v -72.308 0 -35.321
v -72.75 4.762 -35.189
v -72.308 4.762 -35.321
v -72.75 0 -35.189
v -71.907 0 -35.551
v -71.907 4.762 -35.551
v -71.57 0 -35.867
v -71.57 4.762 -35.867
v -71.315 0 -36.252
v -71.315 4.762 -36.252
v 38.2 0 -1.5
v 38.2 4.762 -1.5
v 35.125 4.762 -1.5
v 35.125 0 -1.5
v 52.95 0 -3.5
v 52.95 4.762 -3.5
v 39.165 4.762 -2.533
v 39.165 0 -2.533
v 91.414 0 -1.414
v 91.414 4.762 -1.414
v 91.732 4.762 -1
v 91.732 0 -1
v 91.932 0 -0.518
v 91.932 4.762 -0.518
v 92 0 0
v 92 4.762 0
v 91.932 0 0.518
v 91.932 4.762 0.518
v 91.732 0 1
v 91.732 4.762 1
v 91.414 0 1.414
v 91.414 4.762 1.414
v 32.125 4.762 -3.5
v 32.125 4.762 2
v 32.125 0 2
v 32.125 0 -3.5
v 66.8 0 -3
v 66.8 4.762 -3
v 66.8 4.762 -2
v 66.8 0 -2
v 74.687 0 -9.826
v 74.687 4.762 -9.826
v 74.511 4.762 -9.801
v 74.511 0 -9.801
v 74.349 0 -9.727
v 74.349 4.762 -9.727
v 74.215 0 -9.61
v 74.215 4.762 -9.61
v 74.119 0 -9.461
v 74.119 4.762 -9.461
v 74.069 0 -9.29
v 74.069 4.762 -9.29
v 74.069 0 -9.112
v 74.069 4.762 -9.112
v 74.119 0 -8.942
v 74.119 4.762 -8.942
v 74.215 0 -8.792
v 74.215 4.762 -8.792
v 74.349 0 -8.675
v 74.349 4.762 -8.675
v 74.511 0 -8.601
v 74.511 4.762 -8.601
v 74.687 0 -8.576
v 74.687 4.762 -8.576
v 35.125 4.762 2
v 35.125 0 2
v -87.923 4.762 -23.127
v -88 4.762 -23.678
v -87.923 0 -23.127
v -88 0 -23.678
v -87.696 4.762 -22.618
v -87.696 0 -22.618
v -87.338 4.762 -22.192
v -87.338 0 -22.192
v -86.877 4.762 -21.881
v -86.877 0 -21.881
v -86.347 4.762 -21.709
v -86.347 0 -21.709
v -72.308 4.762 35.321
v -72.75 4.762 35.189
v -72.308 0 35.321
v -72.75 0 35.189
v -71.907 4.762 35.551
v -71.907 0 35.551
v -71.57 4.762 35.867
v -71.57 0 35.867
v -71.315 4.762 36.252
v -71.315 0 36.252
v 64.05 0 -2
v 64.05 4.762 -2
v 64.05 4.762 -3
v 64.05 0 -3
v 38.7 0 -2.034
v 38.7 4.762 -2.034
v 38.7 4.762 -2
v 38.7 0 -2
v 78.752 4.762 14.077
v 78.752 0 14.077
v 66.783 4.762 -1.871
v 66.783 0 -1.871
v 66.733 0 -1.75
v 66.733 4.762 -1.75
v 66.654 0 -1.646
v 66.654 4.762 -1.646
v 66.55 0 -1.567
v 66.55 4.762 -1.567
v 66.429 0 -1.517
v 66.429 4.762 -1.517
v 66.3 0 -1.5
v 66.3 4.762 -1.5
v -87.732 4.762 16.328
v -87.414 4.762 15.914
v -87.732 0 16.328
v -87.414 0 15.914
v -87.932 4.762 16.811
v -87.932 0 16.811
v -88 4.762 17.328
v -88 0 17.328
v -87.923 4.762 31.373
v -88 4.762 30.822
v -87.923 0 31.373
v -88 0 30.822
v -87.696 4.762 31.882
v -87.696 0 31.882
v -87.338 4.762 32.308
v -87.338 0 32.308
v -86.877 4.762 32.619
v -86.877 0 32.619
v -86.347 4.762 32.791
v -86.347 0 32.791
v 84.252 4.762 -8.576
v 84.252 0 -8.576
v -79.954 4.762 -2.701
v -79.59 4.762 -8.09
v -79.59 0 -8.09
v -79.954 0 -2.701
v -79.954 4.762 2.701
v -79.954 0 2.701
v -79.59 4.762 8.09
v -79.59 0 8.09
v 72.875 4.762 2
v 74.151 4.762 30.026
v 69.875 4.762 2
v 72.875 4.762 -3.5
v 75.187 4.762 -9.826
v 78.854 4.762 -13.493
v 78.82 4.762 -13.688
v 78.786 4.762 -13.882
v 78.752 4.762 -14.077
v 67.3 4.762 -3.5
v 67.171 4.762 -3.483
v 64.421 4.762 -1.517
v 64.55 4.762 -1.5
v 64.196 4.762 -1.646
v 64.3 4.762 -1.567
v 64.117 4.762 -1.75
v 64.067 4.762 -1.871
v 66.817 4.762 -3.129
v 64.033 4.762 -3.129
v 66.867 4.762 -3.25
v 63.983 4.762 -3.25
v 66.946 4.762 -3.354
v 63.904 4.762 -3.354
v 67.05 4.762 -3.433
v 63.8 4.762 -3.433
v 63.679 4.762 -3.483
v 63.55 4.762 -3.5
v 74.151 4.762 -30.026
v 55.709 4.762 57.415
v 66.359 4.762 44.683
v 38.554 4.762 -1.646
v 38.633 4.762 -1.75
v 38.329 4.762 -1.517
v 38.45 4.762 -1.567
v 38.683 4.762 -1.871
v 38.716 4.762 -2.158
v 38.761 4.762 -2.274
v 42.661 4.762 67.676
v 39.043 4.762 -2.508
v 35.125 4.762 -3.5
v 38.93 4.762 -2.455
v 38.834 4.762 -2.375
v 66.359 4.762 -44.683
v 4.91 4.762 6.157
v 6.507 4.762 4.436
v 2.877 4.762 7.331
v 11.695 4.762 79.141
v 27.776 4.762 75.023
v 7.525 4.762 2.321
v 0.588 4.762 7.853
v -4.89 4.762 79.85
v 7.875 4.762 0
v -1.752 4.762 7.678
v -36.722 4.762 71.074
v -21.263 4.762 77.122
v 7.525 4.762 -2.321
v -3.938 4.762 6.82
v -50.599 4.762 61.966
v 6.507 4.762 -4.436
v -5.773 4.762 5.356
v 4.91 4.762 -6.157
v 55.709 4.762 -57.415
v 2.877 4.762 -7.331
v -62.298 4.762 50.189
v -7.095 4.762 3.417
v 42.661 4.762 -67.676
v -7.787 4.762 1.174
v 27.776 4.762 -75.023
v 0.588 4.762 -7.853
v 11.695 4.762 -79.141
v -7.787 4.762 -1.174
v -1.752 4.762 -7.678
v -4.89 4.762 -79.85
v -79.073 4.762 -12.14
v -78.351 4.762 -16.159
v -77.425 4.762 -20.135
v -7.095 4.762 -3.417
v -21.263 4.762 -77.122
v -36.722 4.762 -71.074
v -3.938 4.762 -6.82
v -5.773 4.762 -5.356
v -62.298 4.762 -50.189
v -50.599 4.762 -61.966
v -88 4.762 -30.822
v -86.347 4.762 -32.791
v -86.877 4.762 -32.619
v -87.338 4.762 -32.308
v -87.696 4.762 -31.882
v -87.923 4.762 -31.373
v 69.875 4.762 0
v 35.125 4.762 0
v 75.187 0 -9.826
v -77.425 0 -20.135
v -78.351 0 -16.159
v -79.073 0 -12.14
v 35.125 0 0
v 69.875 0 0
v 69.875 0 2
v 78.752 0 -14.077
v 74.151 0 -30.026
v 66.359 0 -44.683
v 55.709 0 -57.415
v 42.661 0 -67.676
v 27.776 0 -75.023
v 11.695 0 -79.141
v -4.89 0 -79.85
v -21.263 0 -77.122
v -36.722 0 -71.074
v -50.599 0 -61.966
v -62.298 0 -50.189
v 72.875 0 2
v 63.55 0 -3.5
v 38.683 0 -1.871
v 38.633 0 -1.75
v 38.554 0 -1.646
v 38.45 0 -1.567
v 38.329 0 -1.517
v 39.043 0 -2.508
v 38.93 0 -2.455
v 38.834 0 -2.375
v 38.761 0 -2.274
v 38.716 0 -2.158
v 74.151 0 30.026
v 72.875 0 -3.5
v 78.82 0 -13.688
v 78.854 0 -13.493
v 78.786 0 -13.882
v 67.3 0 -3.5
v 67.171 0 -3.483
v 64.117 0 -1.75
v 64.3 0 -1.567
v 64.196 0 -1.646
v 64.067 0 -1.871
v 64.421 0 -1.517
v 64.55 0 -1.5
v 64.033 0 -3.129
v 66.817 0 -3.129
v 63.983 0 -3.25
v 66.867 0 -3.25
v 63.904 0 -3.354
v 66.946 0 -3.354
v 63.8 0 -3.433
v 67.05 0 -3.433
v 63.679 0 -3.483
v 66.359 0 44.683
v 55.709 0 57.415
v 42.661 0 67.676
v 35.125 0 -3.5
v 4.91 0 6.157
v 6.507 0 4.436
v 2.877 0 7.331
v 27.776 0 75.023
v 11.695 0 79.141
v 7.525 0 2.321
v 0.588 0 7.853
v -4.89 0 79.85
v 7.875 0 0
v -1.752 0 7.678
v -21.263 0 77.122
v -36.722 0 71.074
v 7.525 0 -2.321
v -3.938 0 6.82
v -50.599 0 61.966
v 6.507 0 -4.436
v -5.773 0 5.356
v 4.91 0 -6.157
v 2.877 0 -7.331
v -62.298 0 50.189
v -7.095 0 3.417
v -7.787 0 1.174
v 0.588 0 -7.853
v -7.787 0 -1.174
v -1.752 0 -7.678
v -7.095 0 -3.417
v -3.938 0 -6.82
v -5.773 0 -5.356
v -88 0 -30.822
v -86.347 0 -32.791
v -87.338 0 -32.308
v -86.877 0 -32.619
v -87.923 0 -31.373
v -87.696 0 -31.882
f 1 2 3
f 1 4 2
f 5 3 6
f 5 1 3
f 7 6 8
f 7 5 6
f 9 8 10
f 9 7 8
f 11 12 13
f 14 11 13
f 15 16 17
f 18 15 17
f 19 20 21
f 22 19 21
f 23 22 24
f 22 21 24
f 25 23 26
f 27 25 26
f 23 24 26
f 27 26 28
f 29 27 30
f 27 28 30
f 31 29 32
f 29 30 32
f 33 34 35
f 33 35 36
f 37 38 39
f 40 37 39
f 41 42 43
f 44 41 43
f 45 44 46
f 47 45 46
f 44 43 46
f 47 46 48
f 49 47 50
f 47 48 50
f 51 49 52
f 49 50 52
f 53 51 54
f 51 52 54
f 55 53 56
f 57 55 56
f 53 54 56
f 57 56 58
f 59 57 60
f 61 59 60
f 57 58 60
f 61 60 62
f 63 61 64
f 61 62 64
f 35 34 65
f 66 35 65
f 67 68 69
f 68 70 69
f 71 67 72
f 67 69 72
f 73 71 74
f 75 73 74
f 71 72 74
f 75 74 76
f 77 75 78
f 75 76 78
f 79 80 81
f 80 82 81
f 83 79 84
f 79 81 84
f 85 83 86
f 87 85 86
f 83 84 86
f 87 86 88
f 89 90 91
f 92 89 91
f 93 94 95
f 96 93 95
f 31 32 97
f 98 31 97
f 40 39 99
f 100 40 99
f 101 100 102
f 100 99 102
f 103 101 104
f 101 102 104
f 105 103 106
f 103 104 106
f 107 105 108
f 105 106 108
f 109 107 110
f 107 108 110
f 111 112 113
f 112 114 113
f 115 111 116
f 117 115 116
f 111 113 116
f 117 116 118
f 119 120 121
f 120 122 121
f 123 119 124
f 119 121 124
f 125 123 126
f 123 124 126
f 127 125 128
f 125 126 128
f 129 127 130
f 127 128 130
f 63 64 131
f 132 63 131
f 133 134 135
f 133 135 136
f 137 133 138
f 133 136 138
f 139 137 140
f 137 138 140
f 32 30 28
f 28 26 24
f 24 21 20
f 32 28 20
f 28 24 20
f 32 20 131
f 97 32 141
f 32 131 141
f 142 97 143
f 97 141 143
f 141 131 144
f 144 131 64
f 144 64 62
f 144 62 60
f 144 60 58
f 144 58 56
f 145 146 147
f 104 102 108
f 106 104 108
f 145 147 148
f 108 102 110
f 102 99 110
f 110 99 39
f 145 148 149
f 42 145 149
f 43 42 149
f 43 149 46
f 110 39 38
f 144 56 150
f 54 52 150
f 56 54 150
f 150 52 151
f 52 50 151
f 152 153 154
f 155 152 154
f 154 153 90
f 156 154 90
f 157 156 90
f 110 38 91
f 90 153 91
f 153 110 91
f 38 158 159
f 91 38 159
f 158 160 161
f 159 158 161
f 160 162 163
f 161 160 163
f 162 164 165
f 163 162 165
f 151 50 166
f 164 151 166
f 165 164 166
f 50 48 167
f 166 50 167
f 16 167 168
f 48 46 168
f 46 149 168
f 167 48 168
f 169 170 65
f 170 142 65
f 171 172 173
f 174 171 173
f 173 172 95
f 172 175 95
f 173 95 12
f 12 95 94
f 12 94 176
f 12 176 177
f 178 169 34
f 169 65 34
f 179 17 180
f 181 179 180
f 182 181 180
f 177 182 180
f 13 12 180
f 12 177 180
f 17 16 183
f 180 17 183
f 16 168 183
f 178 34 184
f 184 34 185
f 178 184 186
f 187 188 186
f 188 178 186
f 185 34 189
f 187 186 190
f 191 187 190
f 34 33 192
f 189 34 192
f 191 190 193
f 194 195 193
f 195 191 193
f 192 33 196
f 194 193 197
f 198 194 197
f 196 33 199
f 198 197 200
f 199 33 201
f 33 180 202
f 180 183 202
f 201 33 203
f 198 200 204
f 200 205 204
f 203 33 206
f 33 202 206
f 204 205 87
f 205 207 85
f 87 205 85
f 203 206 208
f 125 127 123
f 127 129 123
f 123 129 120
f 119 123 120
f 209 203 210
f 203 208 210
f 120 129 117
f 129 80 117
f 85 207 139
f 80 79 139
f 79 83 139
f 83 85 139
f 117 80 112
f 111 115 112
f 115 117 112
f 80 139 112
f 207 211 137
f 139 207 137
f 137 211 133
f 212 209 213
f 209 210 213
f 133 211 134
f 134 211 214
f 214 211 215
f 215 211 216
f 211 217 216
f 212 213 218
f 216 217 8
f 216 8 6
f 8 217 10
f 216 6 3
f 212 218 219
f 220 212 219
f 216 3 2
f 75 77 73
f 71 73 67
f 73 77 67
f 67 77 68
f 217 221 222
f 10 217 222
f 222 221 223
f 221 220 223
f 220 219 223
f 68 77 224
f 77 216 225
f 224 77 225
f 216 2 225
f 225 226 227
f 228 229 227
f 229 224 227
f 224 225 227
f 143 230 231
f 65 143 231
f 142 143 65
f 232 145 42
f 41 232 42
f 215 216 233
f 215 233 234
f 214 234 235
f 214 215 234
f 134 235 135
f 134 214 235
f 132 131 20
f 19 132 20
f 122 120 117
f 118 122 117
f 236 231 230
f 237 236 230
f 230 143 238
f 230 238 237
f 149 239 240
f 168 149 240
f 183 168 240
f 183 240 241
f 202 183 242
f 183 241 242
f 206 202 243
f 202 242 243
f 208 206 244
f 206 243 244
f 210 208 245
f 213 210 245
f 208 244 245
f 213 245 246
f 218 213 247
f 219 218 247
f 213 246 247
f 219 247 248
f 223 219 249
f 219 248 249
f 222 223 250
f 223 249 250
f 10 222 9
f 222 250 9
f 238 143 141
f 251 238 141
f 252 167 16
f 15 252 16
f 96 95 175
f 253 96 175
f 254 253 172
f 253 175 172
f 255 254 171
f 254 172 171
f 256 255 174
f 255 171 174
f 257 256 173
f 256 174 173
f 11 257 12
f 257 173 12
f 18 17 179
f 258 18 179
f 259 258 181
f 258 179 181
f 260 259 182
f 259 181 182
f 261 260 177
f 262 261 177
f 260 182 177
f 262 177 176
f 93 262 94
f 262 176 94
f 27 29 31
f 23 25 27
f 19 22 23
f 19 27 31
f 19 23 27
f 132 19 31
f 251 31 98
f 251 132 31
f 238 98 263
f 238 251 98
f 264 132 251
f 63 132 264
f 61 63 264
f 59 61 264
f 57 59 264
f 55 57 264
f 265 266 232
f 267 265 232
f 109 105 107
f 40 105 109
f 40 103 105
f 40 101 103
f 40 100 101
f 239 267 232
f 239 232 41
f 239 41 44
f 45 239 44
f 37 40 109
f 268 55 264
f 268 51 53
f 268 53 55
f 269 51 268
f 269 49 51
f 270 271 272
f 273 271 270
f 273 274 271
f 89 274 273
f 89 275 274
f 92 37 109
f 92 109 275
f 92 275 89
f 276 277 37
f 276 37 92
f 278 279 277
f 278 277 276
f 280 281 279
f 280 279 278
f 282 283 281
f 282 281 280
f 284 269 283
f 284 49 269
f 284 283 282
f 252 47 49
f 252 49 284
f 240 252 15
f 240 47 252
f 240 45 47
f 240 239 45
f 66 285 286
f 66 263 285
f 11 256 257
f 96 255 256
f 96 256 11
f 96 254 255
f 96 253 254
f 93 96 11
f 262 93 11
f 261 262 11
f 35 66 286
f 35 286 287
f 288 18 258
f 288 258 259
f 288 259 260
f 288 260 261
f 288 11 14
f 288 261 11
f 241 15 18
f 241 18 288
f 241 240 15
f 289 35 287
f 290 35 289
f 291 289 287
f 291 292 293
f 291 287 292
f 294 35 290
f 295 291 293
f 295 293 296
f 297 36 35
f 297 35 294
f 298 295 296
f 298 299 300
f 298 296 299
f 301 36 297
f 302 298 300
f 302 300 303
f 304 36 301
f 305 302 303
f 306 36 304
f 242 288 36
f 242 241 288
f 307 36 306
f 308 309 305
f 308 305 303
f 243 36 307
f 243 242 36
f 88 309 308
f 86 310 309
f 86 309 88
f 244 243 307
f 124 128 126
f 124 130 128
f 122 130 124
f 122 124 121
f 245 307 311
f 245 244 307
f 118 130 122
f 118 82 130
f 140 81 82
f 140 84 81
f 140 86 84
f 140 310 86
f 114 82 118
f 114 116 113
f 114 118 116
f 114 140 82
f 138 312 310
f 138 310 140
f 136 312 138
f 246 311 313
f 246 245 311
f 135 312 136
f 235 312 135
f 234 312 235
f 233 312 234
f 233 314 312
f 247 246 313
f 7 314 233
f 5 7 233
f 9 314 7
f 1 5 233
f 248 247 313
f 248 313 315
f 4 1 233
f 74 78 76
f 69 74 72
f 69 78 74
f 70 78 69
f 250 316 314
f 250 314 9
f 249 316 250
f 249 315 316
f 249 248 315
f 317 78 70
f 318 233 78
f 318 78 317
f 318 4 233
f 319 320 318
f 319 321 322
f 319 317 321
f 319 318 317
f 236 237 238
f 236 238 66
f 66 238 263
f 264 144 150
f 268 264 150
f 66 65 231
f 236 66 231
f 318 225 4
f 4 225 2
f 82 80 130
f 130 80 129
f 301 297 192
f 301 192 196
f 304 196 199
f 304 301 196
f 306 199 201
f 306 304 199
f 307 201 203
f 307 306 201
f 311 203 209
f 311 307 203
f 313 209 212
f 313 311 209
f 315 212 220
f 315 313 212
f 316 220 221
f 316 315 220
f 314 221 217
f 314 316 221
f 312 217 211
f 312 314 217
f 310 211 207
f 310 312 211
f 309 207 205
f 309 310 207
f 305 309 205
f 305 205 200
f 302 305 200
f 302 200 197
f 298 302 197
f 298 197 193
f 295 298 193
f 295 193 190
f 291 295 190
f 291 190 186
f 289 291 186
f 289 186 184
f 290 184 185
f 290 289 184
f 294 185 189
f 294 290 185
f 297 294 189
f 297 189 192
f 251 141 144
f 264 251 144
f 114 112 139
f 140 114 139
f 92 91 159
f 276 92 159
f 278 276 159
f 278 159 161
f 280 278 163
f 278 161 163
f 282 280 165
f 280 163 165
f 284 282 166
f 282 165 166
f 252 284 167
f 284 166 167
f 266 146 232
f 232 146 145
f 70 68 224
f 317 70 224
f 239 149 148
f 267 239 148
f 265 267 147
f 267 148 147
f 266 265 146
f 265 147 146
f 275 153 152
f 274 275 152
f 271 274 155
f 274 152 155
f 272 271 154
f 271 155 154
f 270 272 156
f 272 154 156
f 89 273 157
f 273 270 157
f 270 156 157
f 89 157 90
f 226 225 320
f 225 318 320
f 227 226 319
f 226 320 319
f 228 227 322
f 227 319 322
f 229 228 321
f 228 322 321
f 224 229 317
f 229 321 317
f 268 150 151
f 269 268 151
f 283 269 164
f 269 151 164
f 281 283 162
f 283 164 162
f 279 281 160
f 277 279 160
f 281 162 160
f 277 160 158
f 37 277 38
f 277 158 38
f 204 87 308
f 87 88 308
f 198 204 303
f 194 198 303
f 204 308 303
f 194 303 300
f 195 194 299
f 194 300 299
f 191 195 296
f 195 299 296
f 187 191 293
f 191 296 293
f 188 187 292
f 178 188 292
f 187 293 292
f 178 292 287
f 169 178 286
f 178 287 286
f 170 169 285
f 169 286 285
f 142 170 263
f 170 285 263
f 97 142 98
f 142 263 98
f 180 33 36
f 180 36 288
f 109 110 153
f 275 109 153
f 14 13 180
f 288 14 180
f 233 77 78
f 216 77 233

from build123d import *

# Parameters (mm, degrees)
SKETCH1_R           = 80
SKETCH1_R_2         = 7.875
BOSS_EXTRUDE1_DEPTH = 4.7625
CUT_EXTRUDE1_DEPTH  = 5.7625
BOSS_EXTRUDE2_DEPTH = 4.7625
CUT_EXTRUDE2_DEPTH  = 5.7625
CUT_EXTRUDE5_DEPTH  = 5.7625
FILLET1_R           = 2
SKETCH8_W           = 3
SKETCH8_H           = 5.5
CUT_EXTRUDE6_DEPTH  = 5.7625


with BuildPart() as part:
    # Sketch1 → Boss-Extrude1 (new body)
    with BuildSketch(Plane(origin=(0, 0, 0), x_dir=(1, 0, 0), z_dir=(0, 1, 0))):
        Circle(SKETCH1_R)
        Circle(SKETCH1_R_2, mode=Mode.SUBTRACT)
    extrude(amount=BOSS_EXTRUDE1_DEPTH)

    # Sketch2 → Cut-Extrude1 (cut, through all)
    with BuildSketch(Plane(origin=(0, 4.7625, 0), x_dir=(1, 0, 0), z_dir=(0, 1, 0))):
        with BuildLine():
            Line((34.2, 0), (70.8, 0))
            Line((70.8, 0), (70.8, 3))
            ThreePointArc((70.8, 3), (70.653553391, 3.353553391), (70.3, 3.5))
            Line((70.3, 3.5), (67.3, 3.5))
            ThreePointArc((67.3, 3.5), (66.946446609, 3.353553391), (66.8, 3))
            Line((66.8, 3), (66.8, 2))
            ThreePointArc((66.8, 2), (66.653553391, 1.646446609), (66.3, 1.5))
            Line((66.3, 1.5), (64.55, 1.5))
            ThreePointArc((64.55, 1.5), (64.196446609, 1.646446609), (64.05, 2))
            Line((64.05, 2), (64.05, 3))
            ThreePointArc((64.05, 3), (63.903553391, 3.353553391), (63.55, 3.5))
            Line((63.55, 3.5), (52.95, 3.5))
            Line((52.95, 3.5), (39.164998359, 2.532631464))
            ThreePointArc((39.164998359, 2.532631464), (38.834280968, 2.374812024), (38.7, 2.033858083))
            Line((38.7, 2.033858083), (38.7, 2))
            ThreePointArc((38.7, 2), (38.553553391, 1.646446609), (38.2, 1.5))
            Line((38.2, 1.5), (34.7, 1.5))
            ThreePointArc((34.7, 1.5), (34.346446609, 1.353553391), (34.2, 1))
            Line((34.2, 1), (34.2, 0))
        make_face()
    extrude(amount=-CUT_EXTRUDE1_DEPTH, mode=Mode.SUBTRACT)

    # Sketch4 → Boss-Extrude2 (add)
    with BuildSketch(Plane(origin=(0, 4.7625, 0), x_dir=(1, 0, 0), z_dir=(0, 1, 0))):
        Polygon((-88, 32.5), (-60, 37.43715546), (-60, -37.43715546), (-88, -32.5), (-88, -16.5), (-71.5, 0), (-88, 16.5), align=None)
        with BuildLine():
            Line((78.751819834, 14.076607291), (91.414213562, 1.414213562))
            ThreePointArc((91.414213562, 1.414213562), (92, 0), (91.414213562, -1.414213562))
            Line((91.414213562, -1.414213562), (78.751819834, -14.076607291))
            Line((78.751819834, -14.076607291), (78.751819834, 14.076607291))
        make_face()
    extrude(amount=-BOSS_EXTRUDE2_DEPTH)

    # Sketch3 → Cut-Extrude2 (cut, through all)
    with BuildSketch(Plane(origin=(0, 4.7625, 0), x_dir=(1, 0, 0), z_dir=(0, 1, 0))):
        with BuildLine():
            Line((75.187234449, 9.826135427), (74.687234449, 9.826135427))
            ThreePointArc((74.687234449, 9.826135427), (74.062234449, 9.201135427), (74.687234449, 8.576135427))
            Line((74.687234449, 8.576135427), (84.252291698, 8.576135427))
            Line((84.252291698, 8.576135427), (78.751819834, 14.076607291))
            ThreePointArc((78.751819834, 14.076607291), (78.803418829, 13.784817039), (78.853936691, 13.492837669))
            Line((78.853936691, 13.492837669), (75.187234449, 9.826135427))
        make_face()
    extrude(amount=-CUT_EXTRUDE2_DEPTH, mode=Mode.SUBTRACT)

    # Sketch7 → Cut-Extrude5 (cut, through all)
    with BuildSketch(Plane(origin=(0, 4.7625, 0), x_dir=(1, 0, 0), z_dir=(0, 1, 0))):
        with BuildLine():
            Line((-88, 22), (-77.424613279, 20.13527399))
            ThreePointArc((-77.424613279, 20.13527399), (-78.737936574, 14.154057514), (-79.589907619, 8.089907619))
            Line((-79.589907619, 8.089907619), (-88, 16.5))
            Line((-88, 16.5), (-88, 22))
        make_face()
    extrude(amount=-CUT_EXTRUDE5_DEPTH, mode=Mode.SUBTRACT)

    # Fillet1
    fillet1_edges = [part.edges().sort_by_distance(p)[0] for p in [
        (-88, 2.38125, -22),
        (-71.75940266, 2.38125, 35.363655494),
        (-71.75940266, 2.38125, -35.363655494),
        (-88, 2.38125, -32.5),
        (-88, 2.38125, 16.5),
        (-88, 2.38125, 32.5),
    ]]
    fillet(fillet1_edges, radius=FILLET1_R)

    # Sketch8 → Cut-Extrude6 (cut, through all)
    with BuildSketch(Plane(origin=(0, 4.7625, 0), x_dir=(1, 0, 0), z_dir=(0, 1, 0))):
        with Locations((33.625, 0.75)):
            Rectangle(SKETCH8_W, SKETCH8_H)
        with Locations((71.375, 0.75)):
            Rectangle(SKETCH8_W, SKETCH8_H)
    extrude(amount=-CUT_EXTRUDE6_DEPTH, mode=Mode.SUBTRACT)


solid = part.part
